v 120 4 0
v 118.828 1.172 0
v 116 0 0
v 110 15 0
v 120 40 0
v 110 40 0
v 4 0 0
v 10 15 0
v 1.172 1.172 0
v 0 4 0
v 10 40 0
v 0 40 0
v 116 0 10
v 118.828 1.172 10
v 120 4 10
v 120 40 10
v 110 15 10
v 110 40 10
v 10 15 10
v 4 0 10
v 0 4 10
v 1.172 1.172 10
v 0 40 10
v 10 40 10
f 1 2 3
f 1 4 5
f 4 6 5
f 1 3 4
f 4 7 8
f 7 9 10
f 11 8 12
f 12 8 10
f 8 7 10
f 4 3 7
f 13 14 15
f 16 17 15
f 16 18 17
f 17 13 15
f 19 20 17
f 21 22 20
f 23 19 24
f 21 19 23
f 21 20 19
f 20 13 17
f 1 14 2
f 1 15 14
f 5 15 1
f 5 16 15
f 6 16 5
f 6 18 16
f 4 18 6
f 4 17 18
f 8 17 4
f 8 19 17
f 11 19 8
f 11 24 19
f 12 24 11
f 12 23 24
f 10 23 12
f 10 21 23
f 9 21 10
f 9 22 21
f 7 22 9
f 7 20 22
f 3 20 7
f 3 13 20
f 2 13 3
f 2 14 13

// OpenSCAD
$fn = 32;

// ----------------------------------------------------------------------
// Heat sink frame: 120 x 40 mm frame, 10 mm walls
// ----------------------------------------------------------------------

// --- parameters (mm) ---
profile_height = 10;      // extrusion height
profile_points = 12;      // points of the closed outline

profile = [[0, 4], [1.172, 1.172], [4, 0], [116, 0], [118.828, 1.172], [120, 4], [120, 40], [110, 40], [110, 15], [10, 15], [10, 40], [0, 40]];  // single closed polygon, 12 points, counter clockwise

// --- the one profile operation ---
linear_extrude(height = profile_height) polygon(points = profile);
